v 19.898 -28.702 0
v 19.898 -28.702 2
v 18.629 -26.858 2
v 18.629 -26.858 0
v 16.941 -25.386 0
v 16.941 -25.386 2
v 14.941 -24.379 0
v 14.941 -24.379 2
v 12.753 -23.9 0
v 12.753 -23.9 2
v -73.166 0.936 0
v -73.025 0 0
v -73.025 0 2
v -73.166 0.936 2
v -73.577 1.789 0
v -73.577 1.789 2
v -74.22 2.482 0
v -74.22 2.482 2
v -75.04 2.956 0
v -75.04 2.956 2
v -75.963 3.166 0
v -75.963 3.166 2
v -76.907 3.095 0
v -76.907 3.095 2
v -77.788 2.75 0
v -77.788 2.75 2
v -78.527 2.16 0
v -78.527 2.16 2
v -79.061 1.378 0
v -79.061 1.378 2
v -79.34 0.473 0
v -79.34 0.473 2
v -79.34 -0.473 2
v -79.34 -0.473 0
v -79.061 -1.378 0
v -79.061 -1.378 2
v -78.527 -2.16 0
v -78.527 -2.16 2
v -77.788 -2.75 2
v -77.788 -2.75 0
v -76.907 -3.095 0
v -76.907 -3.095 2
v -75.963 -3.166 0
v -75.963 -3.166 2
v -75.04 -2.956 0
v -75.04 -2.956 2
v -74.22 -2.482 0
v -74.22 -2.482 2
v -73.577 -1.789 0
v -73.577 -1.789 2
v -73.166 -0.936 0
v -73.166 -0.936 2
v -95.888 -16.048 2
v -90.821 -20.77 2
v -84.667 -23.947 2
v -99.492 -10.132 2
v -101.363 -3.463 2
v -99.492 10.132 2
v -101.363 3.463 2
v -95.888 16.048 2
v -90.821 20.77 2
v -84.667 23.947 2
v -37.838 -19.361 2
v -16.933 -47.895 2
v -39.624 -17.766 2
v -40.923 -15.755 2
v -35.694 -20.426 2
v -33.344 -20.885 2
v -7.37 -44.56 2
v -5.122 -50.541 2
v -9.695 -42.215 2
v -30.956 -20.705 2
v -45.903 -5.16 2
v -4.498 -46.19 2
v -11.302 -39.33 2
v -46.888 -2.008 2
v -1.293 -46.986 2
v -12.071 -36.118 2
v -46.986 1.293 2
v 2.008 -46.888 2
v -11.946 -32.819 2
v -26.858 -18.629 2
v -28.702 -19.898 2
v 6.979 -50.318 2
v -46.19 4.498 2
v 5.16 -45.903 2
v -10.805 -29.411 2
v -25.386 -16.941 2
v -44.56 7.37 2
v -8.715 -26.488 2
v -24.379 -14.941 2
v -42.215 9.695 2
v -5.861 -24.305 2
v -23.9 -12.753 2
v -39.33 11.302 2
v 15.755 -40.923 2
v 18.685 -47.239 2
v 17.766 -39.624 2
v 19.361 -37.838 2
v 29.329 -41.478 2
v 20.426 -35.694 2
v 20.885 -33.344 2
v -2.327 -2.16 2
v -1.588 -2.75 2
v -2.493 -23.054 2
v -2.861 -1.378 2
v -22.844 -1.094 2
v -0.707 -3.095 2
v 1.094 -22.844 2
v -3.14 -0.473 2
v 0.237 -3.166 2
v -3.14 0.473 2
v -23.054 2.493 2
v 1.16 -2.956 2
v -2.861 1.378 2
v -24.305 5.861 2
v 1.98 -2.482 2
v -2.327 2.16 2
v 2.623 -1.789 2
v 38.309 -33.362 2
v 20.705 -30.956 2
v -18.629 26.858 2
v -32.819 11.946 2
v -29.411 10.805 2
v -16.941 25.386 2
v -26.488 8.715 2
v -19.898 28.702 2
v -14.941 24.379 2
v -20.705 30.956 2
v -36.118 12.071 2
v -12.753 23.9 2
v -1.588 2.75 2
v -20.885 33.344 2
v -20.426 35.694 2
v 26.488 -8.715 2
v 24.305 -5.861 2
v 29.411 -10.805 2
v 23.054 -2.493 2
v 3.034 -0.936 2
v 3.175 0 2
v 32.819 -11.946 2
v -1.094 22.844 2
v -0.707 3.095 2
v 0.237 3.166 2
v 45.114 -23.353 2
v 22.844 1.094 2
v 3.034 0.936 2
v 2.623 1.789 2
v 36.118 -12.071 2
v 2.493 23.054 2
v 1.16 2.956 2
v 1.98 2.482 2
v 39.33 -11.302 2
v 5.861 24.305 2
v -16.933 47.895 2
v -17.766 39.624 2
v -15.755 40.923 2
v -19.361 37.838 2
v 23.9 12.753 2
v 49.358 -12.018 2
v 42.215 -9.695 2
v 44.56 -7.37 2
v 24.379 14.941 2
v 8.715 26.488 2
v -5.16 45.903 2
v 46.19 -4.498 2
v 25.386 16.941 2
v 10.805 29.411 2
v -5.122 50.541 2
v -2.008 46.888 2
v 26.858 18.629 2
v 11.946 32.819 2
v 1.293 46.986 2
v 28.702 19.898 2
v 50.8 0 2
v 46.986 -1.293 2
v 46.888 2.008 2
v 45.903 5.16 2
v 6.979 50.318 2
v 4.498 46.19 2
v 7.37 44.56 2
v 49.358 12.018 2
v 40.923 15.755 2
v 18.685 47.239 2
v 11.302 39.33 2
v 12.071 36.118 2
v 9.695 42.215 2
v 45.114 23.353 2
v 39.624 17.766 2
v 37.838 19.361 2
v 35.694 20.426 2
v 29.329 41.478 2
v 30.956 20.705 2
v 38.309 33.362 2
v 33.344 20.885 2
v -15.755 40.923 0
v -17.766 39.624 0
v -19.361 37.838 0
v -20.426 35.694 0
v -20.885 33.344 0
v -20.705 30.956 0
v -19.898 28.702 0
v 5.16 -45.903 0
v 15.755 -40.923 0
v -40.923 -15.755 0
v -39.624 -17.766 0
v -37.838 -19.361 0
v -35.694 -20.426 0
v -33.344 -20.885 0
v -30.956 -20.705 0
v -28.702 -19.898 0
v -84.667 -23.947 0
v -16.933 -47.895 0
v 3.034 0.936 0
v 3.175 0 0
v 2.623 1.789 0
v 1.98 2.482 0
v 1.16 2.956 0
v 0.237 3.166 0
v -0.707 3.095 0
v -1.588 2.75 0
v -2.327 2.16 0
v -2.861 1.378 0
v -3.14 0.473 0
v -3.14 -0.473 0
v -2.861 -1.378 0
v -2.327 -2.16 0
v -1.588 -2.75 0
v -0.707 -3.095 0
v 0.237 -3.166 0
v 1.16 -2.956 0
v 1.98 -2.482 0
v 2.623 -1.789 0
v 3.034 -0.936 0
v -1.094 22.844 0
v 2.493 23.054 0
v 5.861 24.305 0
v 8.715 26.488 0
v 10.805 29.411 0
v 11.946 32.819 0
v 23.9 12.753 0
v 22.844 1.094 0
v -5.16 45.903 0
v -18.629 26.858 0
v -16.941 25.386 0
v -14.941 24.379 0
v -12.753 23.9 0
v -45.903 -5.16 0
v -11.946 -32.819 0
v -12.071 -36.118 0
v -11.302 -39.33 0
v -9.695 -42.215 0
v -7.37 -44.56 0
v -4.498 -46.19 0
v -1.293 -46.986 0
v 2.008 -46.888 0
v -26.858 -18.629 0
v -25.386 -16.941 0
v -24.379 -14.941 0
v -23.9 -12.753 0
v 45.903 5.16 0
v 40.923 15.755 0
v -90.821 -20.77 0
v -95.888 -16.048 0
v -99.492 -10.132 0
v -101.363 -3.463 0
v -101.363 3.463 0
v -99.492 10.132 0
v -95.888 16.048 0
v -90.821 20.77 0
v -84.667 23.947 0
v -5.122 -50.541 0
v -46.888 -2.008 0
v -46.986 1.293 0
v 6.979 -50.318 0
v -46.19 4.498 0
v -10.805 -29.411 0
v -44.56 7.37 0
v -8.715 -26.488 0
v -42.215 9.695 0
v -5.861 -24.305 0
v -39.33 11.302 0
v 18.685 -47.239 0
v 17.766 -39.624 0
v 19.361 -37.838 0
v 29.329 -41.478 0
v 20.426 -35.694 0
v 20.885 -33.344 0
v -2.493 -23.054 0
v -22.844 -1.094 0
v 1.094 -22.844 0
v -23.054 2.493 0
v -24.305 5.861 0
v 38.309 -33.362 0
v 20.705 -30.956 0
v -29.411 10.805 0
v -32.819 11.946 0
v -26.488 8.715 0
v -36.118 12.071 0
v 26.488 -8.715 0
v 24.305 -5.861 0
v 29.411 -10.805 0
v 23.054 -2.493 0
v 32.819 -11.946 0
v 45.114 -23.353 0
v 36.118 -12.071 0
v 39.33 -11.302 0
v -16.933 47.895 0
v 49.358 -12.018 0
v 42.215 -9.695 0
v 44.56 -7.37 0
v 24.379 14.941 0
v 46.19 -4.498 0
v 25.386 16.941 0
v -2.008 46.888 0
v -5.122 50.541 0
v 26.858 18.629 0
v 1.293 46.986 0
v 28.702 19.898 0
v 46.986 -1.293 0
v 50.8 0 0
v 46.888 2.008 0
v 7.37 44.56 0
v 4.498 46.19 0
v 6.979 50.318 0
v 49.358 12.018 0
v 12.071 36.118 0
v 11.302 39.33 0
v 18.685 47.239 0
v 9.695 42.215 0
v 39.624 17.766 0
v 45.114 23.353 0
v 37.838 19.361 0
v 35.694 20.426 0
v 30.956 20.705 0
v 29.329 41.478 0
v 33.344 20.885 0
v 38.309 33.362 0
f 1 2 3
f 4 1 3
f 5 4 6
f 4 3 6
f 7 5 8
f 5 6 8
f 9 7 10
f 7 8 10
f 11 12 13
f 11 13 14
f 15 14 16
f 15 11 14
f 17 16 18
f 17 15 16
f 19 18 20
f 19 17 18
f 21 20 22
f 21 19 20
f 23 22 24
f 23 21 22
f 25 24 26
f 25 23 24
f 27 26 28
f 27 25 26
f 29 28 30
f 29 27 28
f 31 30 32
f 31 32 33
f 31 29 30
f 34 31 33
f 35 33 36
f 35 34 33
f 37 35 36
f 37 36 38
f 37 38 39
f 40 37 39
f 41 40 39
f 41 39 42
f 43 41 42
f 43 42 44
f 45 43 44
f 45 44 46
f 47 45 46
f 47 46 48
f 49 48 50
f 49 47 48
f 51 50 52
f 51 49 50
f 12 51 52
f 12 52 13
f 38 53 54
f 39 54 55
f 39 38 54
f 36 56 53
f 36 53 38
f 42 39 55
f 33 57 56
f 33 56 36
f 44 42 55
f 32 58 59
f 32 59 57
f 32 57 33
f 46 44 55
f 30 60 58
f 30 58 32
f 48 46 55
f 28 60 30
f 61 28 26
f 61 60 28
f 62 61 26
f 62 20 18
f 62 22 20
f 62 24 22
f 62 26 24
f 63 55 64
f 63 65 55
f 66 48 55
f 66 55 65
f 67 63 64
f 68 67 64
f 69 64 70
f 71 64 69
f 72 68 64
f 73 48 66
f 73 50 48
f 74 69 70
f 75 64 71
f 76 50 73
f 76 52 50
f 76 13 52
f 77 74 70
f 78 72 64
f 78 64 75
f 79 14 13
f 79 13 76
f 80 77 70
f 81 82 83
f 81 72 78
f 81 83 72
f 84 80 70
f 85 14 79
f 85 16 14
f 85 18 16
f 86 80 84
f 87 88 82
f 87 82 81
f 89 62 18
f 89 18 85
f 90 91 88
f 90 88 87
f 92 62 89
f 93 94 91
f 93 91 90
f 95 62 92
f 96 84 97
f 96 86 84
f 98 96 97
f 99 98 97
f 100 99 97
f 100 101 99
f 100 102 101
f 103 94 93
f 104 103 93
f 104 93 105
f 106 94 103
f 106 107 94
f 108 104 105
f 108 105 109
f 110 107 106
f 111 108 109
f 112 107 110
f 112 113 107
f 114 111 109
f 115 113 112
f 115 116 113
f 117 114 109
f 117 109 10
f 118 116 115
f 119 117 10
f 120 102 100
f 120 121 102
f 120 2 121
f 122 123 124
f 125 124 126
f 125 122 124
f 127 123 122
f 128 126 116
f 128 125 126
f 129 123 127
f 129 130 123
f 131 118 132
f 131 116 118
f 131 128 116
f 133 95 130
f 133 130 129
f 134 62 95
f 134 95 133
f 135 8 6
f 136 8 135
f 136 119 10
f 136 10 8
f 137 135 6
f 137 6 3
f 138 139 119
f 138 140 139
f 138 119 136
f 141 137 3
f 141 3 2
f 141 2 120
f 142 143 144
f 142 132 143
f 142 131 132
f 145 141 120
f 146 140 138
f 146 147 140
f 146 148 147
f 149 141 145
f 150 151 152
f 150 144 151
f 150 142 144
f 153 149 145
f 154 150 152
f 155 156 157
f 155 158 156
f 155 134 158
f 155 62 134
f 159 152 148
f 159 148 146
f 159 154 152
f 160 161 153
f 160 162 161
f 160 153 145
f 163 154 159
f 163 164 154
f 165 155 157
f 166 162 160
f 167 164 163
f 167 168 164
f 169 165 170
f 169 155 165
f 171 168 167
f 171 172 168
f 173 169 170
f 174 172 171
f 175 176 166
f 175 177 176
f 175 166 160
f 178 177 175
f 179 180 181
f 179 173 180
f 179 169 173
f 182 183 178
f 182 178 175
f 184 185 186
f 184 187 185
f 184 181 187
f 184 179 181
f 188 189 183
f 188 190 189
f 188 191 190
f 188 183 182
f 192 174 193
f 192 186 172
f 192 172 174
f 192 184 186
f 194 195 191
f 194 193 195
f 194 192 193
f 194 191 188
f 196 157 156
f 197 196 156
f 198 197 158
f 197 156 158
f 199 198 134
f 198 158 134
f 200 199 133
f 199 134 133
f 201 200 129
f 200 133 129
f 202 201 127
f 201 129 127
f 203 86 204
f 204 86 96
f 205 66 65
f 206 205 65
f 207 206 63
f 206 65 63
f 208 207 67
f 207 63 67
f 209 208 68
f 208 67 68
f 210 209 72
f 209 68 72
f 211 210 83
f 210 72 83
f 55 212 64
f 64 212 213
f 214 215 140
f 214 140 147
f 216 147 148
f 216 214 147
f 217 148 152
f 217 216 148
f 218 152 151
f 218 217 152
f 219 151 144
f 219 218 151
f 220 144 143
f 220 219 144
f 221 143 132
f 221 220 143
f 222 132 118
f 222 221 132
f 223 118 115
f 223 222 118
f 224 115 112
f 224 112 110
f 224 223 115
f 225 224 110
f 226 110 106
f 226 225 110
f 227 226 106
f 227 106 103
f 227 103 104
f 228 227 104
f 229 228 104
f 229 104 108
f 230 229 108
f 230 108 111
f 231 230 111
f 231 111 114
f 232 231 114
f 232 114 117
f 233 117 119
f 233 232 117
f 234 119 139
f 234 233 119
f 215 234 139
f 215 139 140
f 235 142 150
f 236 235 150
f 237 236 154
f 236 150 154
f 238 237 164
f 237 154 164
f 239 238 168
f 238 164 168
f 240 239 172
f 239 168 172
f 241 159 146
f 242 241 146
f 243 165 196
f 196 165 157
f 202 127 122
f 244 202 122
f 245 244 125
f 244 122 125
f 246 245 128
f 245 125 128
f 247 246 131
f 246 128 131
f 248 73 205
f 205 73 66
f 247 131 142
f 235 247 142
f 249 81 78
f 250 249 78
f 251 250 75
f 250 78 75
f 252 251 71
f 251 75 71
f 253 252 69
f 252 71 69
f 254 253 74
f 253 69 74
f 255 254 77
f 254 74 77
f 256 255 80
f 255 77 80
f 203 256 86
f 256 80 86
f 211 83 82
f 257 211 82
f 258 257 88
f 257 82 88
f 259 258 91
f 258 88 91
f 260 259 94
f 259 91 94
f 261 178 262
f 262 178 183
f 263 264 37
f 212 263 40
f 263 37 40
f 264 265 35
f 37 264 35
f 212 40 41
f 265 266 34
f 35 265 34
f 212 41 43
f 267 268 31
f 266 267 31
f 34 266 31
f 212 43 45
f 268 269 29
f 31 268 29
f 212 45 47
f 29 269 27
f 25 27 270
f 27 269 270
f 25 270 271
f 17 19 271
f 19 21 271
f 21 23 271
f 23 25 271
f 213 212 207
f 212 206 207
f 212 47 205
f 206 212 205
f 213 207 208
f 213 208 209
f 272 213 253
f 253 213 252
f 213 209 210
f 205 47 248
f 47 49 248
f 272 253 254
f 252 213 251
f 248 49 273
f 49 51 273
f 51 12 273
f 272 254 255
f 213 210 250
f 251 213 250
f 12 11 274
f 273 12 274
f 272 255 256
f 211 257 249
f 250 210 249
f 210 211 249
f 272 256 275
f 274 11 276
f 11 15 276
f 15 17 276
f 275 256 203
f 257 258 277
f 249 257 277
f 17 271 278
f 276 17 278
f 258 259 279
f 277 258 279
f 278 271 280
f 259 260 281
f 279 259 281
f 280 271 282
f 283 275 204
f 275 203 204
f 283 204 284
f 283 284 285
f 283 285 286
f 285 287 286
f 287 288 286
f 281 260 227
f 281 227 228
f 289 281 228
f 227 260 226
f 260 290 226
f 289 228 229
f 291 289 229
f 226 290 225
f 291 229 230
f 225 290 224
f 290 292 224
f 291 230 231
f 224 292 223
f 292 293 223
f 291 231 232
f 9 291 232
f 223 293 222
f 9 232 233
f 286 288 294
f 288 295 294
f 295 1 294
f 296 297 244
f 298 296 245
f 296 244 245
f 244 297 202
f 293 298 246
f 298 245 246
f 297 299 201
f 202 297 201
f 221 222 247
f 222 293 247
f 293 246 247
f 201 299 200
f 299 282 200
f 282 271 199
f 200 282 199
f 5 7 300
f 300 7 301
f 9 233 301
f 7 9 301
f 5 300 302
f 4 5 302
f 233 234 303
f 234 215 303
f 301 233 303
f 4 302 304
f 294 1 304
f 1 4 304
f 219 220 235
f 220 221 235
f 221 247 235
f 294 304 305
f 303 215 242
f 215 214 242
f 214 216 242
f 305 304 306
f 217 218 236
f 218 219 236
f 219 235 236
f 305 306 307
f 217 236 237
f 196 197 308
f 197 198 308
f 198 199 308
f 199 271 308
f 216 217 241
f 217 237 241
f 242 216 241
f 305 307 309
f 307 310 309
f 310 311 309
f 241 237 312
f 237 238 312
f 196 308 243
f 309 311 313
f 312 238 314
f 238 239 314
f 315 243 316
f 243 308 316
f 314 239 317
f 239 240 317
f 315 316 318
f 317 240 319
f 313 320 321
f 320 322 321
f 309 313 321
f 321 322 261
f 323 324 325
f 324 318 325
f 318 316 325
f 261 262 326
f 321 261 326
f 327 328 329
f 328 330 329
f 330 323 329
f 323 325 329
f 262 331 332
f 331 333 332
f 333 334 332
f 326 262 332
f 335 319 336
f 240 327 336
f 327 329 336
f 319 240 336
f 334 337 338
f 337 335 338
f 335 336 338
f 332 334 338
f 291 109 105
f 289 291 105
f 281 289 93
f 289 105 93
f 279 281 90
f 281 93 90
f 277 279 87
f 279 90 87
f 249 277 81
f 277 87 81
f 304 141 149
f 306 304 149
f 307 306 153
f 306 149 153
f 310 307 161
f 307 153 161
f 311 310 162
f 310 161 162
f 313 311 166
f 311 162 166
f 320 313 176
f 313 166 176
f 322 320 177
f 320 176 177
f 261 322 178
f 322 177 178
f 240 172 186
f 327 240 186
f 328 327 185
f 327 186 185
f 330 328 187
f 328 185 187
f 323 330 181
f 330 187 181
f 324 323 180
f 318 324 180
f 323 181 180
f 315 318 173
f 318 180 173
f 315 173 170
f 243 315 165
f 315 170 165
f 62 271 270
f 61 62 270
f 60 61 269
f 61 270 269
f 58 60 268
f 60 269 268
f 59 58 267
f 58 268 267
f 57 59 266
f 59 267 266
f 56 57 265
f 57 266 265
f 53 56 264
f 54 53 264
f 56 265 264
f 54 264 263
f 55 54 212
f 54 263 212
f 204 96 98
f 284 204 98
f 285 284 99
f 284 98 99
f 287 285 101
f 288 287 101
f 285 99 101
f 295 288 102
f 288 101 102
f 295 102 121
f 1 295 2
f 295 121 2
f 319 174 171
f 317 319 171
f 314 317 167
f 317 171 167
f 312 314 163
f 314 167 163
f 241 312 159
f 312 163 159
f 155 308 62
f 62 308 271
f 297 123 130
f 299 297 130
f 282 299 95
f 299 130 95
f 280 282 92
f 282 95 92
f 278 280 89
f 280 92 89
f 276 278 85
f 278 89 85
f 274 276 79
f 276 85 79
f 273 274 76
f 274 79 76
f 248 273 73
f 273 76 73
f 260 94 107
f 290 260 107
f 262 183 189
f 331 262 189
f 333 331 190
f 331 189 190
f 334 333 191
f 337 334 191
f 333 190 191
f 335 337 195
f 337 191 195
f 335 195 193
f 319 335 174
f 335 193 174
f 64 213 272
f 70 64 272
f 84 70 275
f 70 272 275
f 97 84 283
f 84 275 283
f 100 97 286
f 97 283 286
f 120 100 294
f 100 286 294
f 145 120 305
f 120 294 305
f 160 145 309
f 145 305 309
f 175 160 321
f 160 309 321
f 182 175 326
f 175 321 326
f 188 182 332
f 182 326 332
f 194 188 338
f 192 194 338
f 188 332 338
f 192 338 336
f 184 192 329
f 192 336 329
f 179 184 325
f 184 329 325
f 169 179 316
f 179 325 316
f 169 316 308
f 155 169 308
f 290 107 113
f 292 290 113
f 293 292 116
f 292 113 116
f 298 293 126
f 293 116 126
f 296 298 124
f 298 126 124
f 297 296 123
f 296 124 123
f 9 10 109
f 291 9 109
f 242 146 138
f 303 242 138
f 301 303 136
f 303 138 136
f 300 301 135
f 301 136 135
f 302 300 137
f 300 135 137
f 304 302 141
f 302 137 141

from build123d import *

# Parameters (mm, degrees)
F0_R            = 3.175
F1_DEPTH        = 2
F3_DEPTH        = 2.001
F3_COPIES_COUNT = 4


# Not quite as in the source:
# - a pattern or mirror of a feature is missing from the dataset's text; its kind, count and spacing are read off the source's solid


with BuildPart() as f1:
    # F0 (on Top) → F1 (new body)
    with BuildSketch(Plane.XY):
        with BuildLine():
            Line((-84.6666666667, -23.9473496562), (-16.9333333333, -47.8946993124))
            ThreePointArc((-16.9333333333, -47.8946993124), (50.8, 0), (-16.9333333333, 47.8946993124))
            Line((-16.9333333333, 47.8946993124), (-84.6666666667, 23.9473496562))
            ThreePointArc((-84.6666666667, 23.9473496562), (-101.6, 0), (-84.6666666667, -23.9473496562))
        make_face()
        with Locations((-76.2, 0)):
            Circle(F0_R, mode=Mode.SUBTRACT)
        Circle(F0_R, mode=Mode.SUBTRACT)
    extrude(amount=F1_DEPTH)

    # F2 (on face) → F3 (cut, through all)
    with BuildSketch(Plane.XY.offset(2)):
        with BuildLine():
            ThreePointArc((-28.7020344674, -19.8984633183), (-34.6367957344, -4.4775), (-32.8185304223, 11.945697381))
            ThreePointArc((-32.8185304223, 11.945697381), (-44.5595640794, 7.3696726522), (-45.9028628242, -5.1597895126))
            Line((-45.9028628242, -5.1597895126), (-40.9229625402, -15.7549236864))
            ThreePointArc((-40.9229625402, -15.7549236864), (-35.6939675857, -20.4264925159), (-28.7020344674, -19.8984633183))
        make_face()
        with BuildLine():
            ThreePointArc((-22.8444099031, -1.093728902), (-25.2904359206, 7.3696726522), (-32.8185304223, 11.945697381))
            ThreePointArc((-32.8185304223, 11.945697381), (-34.6367957344, -4.4775), (-28.7020344674, -19.8984633183))
            ThreePointArc((-28.7020344674, -19.8984633183), (-25.386046138, -16.940715135), (-23.9000073953, -12.7531452225))
            Line((-23.9000073953, -12.7531452225), (-22.8444099031, -1.093728902))
        make_face()
    f3 = extrude(amount=-F3_DEPTH, mode=Mode.SUBTRACT)

    # F3_copies: F3 ×4 about axis
    f3_copies_axis = Axis((0, 0, 0), (0, 0, 1))
    for i in range(1, F3_COPIES_COUNT):
        add(f3.rotate(f3_copies_axis, i * 360 / F3_COPIES_COUNT), mode=Mode.SUBTRACT)


solid = f1.part
